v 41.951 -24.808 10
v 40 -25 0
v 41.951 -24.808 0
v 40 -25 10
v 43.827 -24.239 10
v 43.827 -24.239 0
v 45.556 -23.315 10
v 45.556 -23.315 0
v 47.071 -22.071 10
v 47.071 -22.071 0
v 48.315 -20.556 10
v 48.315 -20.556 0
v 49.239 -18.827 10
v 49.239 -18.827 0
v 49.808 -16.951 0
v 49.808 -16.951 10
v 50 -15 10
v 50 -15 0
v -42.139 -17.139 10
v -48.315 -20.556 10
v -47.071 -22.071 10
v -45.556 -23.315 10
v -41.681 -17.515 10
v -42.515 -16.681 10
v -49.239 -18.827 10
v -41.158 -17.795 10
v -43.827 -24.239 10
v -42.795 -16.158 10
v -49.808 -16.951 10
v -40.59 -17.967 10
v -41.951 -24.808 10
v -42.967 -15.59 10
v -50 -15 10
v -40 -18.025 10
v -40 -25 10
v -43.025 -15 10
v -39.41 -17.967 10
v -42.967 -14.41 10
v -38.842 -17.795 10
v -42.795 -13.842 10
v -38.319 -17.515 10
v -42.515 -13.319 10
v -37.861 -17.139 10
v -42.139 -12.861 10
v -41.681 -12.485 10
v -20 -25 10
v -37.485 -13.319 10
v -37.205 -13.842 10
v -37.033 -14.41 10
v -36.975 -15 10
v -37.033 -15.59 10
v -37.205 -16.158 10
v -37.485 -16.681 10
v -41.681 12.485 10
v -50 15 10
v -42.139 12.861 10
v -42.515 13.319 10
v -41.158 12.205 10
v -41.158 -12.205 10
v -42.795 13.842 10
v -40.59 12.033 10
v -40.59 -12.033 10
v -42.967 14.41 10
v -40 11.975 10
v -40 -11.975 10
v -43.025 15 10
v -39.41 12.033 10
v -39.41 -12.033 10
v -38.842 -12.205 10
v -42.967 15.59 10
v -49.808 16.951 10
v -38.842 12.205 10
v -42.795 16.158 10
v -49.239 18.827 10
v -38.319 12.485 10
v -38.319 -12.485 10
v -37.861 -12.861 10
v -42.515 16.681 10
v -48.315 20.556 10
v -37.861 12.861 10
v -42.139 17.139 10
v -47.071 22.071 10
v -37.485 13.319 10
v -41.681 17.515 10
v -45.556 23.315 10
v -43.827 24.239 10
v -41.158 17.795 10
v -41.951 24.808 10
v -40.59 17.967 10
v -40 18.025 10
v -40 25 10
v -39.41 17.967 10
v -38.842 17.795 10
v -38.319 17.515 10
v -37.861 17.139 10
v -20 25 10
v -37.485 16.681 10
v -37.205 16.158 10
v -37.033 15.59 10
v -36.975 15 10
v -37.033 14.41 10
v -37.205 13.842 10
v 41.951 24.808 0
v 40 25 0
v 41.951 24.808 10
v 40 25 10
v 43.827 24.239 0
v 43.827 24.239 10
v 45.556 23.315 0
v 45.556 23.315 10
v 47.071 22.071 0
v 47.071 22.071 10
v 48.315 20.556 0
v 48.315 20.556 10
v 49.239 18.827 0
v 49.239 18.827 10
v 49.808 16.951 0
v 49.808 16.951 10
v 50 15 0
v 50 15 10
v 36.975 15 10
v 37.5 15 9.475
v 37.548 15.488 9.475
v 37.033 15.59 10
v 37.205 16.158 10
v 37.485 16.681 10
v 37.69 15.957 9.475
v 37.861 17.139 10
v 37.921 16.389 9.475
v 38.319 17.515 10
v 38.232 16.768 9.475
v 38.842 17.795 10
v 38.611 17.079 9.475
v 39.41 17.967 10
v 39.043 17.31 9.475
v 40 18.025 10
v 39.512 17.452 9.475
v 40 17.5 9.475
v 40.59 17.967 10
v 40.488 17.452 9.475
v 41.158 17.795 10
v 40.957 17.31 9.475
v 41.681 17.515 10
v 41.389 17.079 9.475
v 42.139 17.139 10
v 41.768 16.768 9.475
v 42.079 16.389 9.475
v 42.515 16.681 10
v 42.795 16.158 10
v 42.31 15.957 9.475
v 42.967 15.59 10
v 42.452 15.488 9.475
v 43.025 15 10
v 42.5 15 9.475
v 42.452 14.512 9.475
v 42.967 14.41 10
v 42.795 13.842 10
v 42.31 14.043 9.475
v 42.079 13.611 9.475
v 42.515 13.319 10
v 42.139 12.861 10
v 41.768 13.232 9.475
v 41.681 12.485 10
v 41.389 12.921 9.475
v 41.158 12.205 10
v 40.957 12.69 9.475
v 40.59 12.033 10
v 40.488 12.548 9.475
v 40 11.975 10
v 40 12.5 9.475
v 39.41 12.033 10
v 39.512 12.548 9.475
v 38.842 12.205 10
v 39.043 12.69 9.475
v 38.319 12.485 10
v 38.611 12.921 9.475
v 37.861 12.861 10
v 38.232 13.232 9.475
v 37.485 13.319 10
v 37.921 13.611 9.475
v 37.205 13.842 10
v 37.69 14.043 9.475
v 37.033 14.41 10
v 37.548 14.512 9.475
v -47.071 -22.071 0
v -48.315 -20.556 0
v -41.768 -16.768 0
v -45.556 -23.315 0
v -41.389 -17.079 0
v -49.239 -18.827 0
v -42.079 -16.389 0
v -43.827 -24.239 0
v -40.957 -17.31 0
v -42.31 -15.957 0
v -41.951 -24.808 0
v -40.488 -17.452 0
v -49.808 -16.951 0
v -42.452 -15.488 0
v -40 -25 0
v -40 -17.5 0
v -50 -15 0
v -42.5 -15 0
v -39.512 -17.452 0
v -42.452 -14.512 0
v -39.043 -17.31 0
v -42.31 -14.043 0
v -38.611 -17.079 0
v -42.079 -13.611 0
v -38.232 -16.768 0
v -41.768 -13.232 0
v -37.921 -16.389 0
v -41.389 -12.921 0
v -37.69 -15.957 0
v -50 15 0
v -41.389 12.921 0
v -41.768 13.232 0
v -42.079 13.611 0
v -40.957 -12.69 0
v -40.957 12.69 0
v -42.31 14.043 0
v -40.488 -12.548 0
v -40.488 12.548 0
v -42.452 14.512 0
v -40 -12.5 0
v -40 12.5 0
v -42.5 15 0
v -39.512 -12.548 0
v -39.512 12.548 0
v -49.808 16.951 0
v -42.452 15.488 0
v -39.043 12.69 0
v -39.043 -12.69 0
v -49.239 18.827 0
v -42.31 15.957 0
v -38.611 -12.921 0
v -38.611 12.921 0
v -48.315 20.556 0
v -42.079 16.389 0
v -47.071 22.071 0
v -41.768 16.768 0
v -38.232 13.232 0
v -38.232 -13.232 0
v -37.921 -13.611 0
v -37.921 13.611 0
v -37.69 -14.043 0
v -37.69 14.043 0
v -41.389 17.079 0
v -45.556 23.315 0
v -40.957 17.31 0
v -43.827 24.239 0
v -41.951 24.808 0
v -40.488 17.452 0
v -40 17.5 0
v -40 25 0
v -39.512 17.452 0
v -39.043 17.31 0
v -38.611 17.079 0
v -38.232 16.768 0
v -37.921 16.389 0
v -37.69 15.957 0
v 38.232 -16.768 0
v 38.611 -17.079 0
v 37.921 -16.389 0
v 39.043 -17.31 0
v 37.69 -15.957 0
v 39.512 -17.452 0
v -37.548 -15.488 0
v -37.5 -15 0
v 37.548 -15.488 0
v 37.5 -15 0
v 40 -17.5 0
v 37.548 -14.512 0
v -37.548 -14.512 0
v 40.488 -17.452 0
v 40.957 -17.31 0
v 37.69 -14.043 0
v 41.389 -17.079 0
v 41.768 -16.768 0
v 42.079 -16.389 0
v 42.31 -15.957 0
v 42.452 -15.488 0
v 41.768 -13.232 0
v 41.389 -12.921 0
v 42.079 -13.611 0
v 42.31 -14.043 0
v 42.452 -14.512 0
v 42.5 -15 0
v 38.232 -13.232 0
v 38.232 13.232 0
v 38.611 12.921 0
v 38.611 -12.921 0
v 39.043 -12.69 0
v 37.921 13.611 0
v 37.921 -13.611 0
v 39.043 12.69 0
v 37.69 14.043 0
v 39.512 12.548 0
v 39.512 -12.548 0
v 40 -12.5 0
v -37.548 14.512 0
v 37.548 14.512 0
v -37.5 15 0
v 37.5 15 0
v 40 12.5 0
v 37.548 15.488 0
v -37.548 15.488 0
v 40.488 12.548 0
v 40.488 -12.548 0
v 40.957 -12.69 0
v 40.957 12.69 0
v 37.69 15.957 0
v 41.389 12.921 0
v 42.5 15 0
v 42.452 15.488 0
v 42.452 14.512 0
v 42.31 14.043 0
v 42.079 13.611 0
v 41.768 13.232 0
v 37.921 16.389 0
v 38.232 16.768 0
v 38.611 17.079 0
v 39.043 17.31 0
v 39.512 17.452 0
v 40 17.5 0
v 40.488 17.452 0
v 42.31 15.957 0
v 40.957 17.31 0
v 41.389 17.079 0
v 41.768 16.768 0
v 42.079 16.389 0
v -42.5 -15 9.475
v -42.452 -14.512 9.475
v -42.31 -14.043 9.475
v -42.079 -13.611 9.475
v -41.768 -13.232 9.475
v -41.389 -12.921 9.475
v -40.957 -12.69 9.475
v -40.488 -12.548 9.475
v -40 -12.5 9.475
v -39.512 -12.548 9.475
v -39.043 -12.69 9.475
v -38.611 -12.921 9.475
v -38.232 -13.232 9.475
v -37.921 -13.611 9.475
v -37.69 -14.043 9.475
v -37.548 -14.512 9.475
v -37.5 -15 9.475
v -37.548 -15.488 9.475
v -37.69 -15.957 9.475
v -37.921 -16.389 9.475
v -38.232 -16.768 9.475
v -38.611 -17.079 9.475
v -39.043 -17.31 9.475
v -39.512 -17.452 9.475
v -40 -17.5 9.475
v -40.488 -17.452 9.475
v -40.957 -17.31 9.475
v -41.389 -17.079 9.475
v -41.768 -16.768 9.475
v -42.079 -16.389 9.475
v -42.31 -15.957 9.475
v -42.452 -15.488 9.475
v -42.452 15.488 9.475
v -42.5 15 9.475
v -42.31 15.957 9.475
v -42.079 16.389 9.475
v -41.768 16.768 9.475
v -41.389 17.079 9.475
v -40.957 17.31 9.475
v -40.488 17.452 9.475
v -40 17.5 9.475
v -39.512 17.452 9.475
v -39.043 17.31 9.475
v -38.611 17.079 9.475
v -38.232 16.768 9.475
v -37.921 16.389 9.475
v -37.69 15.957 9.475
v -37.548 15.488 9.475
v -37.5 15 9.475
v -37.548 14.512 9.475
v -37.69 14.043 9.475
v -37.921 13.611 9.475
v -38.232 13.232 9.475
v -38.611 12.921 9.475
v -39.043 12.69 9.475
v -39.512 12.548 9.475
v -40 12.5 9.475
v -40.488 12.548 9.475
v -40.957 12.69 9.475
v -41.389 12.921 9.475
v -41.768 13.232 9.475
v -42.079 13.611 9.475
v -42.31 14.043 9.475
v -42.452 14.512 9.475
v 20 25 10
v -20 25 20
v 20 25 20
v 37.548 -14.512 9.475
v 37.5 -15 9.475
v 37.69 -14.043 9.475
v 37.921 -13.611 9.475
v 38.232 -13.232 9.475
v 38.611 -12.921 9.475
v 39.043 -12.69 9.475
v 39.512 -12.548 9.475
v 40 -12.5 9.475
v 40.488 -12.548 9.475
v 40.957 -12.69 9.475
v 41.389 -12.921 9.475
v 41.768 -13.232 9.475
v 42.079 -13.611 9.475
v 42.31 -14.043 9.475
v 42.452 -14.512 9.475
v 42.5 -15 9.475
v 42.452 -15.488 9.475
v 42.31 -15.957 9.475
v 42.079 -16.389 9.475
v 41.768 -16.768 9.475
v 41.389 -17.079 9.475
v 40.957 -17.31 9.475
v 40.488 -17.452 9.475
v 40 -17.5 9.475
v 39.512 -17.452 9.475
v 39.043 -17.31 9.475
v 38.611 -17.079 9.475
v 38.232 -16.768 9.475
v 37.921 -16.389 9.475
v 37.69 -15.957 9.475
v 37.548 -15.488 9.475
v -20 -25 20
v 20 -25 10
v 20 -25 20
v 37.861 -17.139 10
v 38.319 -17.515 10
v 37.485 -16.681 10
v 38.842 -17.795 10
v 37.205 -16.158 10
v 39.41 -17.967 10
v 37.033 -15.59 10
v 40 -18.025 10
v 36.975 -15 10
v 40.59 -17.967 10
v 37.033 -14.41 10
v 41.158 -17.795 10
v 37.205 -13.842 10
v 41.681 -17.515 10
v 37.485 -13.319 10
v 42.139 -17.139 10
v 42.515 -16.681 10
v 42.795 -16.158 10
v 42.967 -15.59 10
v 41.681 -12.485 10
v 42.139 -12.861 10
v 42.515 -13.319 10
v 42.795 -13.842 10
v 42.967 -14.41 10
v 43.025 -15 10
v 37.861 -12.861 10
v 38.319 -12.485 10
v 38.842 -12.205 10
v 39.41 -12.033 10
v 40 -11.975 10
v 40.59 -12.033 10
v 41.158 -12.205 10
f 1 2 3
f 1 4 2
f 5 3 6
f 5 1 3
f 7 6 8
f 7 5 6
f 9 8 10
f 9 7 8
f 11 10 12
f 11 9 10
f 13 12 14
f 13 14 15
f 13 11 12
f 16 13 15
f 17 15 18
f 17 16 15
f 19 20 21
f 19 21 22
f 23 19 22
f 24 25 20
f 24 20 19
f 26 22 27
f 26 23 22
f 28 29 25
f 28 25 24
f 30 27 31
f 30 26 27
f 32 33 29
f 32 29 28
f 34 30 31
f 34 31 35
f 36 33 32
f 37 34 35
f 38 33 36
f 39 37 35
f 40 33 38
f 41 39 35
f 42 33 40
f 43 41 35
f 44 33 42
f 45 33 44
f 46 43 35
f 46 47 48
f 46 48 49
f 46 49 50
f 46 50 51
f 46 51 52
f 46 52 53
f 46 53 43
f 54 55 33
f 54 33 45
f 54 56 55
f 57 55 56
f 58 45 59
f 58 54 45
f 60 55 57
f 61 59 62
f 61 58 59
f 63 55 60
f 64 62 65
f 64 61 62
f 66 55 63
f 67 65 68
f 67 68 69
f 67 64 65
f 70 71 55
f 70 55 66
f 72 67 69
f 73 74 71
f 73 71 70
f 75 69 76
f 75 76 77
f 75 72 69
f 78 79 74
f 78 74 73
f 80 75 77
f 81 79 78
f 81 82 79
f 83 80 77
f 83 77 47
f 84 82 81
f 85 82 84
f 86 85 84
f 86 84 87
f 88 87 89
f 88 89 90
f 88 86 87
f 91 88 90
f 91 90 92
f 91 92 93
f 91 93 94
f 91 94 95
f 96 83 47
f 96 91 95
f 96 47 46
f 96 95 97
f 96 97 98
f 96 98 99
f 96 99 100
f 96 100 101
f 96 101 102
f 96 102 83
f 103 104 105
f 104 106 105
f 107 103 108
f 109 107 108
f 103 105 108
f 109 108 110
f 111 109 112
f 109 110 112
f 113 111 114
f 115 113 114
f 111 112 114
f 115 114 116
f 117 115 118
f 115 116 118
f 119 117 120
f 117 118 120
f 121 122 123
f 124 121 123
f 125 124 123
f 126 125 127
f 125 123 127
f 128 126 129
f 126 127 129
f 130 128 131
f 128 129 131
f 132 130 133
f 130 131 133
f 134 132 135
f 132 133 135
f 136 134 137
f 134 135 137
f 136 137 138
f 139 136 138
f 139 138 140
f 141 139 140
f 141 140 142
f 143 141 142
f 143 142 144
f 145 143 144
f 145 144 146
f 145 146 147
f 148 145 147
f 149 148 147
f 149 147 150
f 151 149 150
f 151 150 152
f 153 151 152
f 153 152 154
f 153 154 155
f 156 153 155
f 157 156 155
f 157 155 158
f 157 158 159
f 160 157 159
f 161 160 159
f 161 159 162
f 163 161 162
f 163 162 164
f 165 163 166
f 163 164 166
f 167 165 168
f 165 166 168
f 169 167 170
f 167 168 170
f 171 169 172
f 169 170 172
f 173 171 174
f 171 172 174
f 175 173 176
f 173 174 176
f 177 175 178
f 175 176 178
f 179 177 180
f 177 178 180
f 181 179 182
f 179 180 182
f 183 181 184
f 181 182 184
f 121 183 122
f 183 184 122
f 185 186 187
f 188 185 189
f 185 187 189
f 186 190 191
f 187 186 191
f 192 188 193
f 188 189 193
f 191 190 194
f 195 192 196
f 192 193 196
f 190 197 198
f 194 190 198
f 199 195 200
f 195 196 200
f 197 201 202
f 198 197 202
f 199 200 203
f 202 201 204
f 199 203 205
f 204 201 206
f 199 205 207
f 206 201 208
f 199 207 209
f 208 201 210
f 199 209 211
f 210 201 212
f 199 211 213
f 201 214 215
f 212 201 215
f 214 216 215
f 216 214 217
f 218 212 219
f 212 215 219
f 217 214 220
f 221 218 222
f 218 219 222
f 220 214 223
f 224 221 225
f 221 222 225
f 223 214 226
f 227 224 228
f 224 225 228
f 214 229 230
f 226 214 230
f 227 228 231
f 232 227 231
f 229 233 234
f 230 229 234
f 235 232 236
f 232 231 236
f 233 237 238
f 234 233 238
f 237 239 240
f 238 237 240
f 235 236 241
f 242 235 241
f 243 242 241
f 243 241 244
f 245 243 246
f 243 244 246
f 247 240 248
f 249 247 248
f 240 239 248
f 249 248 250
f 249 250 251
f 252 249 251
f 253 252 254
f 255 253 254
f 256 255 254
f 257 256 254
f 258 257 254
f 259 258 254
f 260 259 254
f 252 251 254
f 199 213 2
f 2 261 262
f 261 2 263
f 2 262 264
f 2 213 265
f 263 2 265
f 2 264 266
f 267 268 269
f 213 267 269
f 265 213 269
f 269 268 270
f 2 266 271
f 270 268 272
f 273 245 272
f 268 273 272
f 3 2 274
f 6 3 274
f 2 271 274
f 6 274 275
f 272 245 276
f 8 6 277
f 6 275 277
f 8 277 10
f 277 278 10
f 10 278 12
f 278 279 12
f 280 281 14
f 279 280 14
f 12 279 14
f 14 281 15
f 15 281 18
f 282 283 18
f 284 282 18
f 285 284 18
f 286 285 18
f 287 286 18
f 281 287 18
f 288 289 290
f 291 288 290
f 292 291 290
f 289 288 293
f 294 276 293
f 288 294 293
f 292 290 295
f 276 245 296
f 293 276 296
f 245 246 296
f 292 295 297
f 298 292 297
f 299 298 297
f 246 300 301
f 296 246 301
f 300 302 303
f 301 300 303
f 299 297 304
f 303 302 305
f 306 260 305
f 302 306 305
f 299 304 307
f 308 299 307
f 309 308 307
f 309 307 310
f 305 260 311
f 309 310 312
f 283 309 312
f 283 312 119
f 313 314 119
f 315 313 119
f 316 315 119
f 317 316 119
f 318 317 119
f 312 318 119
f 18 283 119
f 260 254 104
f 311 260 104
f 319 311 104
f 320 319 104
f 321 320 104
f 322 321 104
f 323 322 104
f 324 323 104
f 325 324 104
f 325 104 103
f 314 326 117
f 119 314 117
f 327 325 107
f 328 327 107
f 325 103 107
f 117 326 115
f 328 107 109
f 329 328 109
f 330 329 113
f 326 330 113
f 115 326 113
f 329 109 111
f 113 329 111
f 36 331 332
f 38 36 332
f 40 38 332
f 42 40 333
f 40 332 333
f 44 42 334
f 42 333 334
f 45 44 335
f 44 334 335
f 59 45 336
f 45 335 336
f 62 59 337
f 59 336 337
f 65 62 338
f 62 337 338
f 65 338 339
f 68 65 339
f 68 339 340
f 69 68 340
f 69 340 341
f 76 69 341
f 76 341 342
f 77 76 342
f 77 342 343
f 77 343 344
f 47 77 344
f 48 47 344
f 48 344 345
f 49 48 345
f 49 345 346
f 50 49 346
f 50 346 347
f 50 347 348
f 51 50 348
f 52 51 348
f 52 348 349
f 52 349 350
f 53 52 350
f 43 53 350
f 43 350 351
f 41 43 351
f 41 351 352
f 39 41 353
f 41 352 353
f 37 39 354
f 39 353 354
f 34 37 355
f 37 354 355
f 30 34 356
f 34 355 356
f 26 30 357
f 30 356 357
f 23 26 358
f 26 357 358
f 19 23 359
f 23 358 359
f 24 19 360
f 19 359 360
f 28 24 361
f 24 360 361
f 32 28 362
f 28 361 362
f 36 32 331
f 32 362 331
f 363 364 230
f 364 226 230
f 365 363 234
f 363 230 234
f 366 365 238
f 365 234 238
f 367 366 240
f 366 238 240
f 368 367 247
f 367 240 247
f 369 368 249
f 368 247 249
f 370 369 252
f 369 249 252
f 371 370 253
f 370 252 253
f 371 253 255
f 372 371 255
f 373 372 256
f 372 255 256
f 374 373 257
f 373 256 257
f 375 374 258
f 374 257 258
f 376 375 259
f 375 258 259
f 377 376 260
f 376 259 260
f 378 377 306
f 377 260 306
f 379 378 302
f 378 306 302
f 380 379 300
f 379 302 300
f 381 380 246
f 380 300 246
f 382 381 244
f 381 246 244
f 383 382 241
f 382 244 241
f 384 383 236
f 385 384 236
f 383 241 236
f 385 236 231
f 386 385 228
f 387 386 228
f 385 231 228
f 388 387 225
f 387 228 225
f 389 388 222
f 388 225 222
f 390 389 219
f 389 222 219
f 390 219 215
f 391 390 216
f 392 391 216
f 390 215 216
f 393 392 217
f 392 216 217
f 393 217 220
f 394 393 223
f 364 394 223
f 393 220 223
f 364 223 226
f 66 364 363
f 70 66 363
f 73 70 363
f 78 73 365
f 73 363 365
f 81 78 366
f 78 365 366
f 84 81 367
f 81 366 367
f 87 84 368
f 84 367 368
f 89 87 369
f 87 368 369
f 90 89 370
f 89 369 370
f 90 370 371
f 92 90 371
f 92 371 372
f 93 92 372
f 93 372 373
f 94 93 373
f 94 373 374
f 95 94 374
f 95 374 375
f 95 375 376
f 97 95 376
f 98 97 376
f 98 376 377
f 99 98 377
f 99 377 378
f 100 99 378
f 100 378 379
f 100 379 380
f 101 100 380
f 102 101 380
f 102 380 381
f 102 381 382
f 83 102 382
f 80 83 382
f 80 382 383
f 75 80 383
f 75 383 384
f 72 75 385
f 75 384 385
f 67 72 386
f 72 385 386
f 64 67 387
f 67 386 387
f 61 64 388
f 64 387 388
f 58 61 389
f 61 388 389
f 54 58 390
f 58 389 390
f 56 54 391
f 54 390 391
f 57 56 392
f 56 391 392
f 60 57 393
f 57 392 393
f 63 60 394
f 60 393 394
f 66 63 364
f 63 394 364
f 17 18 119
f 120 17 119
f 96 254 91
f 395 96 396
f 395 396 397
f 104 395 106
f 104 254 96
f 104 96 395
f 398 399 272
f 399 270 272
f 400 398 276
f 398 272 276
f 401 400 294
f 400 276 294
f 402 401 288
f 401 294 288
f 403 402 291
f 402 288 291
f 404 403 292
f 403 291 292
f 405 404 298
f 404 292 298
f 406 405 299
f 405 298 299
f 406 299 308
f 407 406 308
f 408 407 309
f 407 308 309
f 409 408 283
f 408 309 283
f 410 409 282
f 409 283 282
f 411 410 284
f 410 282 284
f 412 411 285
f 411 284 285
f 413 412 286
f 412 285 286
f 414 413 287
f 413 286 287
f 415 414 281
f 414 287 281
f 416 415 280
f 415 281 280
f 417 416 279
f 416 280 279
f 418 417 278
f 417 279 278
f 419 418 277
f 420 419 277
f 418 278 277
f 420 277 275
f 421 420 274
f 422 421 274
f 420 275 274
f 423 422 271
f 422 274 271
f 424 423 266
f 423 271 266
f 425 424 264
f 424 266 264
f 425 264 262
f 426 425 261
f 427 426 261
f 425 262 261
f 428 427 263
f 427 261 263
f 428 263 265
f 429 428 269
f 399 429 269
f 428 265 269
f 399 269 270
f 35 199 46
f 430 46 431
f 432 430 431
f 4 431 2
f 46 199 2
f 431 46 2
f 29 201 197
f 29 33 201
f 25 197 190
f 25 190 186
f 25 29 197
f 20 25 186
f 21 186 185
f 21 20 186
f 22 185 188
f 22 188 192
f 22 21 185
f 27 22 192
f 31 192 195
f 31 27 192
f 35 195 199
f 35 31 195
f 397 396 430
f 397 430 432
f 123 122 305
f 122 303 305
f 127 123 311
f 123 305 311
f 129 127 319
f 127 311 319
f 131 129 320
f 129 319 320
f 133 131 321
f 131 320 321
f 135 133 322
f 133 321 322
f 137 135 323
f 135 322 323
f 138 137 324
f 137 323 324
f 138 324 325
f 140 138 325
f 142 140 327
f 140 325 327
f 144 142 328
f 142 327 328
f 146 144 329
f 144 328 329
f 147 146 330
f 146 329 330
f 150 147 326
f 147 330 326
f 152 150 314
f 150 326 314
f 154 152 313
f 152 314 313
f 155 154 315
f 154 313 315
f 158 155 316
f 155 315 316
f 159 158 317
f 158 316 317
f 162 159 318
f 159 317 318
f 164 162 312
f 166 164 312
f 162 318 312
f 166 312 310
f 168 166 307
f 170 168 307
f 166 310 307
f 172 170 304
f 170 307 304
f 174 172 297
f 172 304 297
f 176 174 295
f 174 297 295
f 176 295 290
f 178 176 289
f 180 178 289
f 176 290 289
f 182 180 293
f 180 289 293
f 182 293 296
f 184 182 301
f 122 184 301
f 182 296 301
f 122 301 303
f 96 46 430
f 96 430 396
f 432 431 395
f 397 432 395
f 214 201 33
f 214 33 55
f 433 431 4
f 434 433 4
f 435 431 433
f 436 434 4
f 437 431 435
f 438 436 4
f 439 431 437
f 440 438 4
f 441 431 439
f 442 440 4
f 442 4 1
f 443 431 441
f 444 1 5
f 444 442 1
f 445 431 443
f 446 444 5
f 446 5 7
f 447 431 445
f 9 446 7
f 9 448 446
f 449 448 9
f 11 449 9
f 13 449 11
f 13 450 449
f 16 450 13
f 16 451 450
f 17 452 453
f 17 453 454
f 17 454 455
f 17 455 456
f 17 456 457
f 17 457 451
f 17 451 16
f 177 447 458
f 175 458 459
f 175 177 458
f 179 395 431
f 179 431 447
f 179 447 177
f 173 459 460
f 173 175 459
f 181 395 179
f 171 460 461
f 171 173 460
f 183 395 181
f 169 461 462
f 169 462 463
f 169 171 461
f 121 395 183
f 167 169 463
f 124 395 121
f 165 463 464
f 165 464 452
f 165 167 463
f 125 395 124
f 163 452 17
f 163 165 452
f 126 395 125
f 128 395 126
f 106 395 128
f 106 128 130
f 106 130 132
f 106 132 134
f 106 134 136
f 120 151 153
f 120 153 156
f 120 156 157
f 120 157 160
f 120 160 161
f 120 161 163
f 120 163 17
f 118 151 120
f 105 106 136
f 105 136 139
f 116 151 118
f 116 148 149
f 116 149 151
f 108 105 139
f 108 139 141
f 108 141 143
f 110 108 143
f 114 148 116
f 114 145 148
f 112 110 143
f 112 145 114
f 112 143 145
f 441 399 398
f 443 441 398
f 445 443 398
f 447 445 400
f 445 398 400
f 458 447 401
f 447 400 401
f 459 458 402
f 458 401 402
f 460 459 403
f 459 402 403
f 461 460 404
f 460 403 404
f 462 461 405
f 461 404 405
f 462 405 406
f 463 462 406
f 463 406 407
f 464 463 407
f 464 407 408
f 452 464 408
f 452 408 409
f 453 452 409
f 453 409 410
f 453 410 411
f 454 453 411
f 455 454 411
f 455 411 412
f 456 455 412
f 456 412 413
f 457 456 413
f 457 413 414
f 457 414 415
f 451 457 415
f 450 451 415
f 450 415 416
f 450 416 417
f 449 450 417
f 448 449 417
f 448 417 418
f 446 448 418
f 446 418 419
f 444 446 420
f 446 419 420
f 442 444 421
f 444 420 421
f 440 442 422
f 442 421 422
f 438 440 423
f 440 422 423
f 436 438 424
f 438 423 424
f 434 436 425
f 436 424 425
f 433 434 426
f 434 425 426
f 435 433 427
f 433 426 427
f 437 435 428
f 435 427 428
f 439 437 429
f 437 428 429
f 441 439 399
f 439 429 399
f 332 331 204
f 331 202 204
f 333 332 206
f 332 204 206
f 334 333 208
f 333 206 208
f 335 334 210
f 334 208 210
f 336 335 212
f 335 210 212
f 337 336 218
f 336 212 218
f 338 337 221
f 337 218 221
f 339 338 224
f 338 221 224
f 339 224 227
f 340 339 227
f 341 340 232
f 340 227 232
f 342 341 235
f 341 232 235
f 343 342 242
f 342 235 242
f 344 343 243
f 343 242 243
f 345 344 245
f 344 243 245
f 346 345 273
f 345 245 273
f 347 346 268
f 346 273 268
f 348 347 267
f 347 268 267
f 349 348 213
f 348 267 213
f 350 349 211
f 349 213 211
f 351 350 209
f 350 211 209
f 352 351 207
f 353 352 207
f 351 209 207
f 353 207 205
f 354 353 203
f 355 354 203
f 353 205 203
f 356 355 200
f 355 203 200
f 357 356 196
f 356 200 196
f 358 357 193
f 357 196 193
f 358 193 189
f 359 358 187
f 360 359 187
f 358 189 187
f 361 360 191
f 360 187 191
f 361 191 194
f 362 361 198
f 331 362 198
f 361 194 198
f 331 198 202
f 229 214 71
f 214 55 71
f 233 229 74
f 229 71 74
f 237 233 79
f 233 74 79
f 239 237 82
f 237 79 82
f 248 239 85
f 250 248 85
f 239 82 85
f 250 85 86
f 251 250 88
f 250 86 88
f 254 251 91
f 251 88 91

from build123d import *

# Parameters (mm, degrees)
SKETCH_1_W                   = 100
SKETCH_1_H                   = 50
EXTRUDE_1_DEPTH              = 10
SKETCH_2_W                   = 40
SKETCH_2_H                   = 50
EXTRUDE_2_DEPTH              = 10
FILLET_1_R                   = 10
HOLE_WIZARD_M6_1_D           = 5
HOLE_WIZARD_M6_1_CSINK_D     = 6.05
HOLE_WIZARD_M6_1_CSINK_ANGLE = 90


with BuildPart() as part:
    # 草图1 → 凸台-拉伸1 (new body)
    with BuildSketch(Plane.XY):
        Rectangle(SKETCH_1_W, SKETCH_1_H)
    extrude(amount=EXTRUDE_1_DEPTH)

    # 草图2 → 凸台-拉伸2 (add)
    with BuildSketch(Plane.XY.offset(10)):
        Rectangle(SKETCH_2_W, SKETCH_2_H)
    extrude(amount=EXTRUDE_2_DEPTH)

    # 圆角1
    fillet_1_edges = [part.edges().sort_by_distance(p)[0] for p in [
        (50, -25, 5),
        (-50, -25, 5),
        (-50, 25, 5),
        (50, 25, 5),
    ]]
    fillet(fillet_1_edges, radius=FILLET_1_R)

    # M6 螺纹孔1 (through all)
    with Locations(Plane.XY.offset(10)):
        with Locations((-40, 15), (-40, -15), (40, -15), (40, 15)):
            CounterSinkHole(HOLE_WIZARD_M6_1_D / 2, HOLE_WIZARD_M6_1_CSINK_D / 2, counter_sink_angle=HOLE_WIZARD_M6_1_CSINK_ANGLE)


solid = part.part
